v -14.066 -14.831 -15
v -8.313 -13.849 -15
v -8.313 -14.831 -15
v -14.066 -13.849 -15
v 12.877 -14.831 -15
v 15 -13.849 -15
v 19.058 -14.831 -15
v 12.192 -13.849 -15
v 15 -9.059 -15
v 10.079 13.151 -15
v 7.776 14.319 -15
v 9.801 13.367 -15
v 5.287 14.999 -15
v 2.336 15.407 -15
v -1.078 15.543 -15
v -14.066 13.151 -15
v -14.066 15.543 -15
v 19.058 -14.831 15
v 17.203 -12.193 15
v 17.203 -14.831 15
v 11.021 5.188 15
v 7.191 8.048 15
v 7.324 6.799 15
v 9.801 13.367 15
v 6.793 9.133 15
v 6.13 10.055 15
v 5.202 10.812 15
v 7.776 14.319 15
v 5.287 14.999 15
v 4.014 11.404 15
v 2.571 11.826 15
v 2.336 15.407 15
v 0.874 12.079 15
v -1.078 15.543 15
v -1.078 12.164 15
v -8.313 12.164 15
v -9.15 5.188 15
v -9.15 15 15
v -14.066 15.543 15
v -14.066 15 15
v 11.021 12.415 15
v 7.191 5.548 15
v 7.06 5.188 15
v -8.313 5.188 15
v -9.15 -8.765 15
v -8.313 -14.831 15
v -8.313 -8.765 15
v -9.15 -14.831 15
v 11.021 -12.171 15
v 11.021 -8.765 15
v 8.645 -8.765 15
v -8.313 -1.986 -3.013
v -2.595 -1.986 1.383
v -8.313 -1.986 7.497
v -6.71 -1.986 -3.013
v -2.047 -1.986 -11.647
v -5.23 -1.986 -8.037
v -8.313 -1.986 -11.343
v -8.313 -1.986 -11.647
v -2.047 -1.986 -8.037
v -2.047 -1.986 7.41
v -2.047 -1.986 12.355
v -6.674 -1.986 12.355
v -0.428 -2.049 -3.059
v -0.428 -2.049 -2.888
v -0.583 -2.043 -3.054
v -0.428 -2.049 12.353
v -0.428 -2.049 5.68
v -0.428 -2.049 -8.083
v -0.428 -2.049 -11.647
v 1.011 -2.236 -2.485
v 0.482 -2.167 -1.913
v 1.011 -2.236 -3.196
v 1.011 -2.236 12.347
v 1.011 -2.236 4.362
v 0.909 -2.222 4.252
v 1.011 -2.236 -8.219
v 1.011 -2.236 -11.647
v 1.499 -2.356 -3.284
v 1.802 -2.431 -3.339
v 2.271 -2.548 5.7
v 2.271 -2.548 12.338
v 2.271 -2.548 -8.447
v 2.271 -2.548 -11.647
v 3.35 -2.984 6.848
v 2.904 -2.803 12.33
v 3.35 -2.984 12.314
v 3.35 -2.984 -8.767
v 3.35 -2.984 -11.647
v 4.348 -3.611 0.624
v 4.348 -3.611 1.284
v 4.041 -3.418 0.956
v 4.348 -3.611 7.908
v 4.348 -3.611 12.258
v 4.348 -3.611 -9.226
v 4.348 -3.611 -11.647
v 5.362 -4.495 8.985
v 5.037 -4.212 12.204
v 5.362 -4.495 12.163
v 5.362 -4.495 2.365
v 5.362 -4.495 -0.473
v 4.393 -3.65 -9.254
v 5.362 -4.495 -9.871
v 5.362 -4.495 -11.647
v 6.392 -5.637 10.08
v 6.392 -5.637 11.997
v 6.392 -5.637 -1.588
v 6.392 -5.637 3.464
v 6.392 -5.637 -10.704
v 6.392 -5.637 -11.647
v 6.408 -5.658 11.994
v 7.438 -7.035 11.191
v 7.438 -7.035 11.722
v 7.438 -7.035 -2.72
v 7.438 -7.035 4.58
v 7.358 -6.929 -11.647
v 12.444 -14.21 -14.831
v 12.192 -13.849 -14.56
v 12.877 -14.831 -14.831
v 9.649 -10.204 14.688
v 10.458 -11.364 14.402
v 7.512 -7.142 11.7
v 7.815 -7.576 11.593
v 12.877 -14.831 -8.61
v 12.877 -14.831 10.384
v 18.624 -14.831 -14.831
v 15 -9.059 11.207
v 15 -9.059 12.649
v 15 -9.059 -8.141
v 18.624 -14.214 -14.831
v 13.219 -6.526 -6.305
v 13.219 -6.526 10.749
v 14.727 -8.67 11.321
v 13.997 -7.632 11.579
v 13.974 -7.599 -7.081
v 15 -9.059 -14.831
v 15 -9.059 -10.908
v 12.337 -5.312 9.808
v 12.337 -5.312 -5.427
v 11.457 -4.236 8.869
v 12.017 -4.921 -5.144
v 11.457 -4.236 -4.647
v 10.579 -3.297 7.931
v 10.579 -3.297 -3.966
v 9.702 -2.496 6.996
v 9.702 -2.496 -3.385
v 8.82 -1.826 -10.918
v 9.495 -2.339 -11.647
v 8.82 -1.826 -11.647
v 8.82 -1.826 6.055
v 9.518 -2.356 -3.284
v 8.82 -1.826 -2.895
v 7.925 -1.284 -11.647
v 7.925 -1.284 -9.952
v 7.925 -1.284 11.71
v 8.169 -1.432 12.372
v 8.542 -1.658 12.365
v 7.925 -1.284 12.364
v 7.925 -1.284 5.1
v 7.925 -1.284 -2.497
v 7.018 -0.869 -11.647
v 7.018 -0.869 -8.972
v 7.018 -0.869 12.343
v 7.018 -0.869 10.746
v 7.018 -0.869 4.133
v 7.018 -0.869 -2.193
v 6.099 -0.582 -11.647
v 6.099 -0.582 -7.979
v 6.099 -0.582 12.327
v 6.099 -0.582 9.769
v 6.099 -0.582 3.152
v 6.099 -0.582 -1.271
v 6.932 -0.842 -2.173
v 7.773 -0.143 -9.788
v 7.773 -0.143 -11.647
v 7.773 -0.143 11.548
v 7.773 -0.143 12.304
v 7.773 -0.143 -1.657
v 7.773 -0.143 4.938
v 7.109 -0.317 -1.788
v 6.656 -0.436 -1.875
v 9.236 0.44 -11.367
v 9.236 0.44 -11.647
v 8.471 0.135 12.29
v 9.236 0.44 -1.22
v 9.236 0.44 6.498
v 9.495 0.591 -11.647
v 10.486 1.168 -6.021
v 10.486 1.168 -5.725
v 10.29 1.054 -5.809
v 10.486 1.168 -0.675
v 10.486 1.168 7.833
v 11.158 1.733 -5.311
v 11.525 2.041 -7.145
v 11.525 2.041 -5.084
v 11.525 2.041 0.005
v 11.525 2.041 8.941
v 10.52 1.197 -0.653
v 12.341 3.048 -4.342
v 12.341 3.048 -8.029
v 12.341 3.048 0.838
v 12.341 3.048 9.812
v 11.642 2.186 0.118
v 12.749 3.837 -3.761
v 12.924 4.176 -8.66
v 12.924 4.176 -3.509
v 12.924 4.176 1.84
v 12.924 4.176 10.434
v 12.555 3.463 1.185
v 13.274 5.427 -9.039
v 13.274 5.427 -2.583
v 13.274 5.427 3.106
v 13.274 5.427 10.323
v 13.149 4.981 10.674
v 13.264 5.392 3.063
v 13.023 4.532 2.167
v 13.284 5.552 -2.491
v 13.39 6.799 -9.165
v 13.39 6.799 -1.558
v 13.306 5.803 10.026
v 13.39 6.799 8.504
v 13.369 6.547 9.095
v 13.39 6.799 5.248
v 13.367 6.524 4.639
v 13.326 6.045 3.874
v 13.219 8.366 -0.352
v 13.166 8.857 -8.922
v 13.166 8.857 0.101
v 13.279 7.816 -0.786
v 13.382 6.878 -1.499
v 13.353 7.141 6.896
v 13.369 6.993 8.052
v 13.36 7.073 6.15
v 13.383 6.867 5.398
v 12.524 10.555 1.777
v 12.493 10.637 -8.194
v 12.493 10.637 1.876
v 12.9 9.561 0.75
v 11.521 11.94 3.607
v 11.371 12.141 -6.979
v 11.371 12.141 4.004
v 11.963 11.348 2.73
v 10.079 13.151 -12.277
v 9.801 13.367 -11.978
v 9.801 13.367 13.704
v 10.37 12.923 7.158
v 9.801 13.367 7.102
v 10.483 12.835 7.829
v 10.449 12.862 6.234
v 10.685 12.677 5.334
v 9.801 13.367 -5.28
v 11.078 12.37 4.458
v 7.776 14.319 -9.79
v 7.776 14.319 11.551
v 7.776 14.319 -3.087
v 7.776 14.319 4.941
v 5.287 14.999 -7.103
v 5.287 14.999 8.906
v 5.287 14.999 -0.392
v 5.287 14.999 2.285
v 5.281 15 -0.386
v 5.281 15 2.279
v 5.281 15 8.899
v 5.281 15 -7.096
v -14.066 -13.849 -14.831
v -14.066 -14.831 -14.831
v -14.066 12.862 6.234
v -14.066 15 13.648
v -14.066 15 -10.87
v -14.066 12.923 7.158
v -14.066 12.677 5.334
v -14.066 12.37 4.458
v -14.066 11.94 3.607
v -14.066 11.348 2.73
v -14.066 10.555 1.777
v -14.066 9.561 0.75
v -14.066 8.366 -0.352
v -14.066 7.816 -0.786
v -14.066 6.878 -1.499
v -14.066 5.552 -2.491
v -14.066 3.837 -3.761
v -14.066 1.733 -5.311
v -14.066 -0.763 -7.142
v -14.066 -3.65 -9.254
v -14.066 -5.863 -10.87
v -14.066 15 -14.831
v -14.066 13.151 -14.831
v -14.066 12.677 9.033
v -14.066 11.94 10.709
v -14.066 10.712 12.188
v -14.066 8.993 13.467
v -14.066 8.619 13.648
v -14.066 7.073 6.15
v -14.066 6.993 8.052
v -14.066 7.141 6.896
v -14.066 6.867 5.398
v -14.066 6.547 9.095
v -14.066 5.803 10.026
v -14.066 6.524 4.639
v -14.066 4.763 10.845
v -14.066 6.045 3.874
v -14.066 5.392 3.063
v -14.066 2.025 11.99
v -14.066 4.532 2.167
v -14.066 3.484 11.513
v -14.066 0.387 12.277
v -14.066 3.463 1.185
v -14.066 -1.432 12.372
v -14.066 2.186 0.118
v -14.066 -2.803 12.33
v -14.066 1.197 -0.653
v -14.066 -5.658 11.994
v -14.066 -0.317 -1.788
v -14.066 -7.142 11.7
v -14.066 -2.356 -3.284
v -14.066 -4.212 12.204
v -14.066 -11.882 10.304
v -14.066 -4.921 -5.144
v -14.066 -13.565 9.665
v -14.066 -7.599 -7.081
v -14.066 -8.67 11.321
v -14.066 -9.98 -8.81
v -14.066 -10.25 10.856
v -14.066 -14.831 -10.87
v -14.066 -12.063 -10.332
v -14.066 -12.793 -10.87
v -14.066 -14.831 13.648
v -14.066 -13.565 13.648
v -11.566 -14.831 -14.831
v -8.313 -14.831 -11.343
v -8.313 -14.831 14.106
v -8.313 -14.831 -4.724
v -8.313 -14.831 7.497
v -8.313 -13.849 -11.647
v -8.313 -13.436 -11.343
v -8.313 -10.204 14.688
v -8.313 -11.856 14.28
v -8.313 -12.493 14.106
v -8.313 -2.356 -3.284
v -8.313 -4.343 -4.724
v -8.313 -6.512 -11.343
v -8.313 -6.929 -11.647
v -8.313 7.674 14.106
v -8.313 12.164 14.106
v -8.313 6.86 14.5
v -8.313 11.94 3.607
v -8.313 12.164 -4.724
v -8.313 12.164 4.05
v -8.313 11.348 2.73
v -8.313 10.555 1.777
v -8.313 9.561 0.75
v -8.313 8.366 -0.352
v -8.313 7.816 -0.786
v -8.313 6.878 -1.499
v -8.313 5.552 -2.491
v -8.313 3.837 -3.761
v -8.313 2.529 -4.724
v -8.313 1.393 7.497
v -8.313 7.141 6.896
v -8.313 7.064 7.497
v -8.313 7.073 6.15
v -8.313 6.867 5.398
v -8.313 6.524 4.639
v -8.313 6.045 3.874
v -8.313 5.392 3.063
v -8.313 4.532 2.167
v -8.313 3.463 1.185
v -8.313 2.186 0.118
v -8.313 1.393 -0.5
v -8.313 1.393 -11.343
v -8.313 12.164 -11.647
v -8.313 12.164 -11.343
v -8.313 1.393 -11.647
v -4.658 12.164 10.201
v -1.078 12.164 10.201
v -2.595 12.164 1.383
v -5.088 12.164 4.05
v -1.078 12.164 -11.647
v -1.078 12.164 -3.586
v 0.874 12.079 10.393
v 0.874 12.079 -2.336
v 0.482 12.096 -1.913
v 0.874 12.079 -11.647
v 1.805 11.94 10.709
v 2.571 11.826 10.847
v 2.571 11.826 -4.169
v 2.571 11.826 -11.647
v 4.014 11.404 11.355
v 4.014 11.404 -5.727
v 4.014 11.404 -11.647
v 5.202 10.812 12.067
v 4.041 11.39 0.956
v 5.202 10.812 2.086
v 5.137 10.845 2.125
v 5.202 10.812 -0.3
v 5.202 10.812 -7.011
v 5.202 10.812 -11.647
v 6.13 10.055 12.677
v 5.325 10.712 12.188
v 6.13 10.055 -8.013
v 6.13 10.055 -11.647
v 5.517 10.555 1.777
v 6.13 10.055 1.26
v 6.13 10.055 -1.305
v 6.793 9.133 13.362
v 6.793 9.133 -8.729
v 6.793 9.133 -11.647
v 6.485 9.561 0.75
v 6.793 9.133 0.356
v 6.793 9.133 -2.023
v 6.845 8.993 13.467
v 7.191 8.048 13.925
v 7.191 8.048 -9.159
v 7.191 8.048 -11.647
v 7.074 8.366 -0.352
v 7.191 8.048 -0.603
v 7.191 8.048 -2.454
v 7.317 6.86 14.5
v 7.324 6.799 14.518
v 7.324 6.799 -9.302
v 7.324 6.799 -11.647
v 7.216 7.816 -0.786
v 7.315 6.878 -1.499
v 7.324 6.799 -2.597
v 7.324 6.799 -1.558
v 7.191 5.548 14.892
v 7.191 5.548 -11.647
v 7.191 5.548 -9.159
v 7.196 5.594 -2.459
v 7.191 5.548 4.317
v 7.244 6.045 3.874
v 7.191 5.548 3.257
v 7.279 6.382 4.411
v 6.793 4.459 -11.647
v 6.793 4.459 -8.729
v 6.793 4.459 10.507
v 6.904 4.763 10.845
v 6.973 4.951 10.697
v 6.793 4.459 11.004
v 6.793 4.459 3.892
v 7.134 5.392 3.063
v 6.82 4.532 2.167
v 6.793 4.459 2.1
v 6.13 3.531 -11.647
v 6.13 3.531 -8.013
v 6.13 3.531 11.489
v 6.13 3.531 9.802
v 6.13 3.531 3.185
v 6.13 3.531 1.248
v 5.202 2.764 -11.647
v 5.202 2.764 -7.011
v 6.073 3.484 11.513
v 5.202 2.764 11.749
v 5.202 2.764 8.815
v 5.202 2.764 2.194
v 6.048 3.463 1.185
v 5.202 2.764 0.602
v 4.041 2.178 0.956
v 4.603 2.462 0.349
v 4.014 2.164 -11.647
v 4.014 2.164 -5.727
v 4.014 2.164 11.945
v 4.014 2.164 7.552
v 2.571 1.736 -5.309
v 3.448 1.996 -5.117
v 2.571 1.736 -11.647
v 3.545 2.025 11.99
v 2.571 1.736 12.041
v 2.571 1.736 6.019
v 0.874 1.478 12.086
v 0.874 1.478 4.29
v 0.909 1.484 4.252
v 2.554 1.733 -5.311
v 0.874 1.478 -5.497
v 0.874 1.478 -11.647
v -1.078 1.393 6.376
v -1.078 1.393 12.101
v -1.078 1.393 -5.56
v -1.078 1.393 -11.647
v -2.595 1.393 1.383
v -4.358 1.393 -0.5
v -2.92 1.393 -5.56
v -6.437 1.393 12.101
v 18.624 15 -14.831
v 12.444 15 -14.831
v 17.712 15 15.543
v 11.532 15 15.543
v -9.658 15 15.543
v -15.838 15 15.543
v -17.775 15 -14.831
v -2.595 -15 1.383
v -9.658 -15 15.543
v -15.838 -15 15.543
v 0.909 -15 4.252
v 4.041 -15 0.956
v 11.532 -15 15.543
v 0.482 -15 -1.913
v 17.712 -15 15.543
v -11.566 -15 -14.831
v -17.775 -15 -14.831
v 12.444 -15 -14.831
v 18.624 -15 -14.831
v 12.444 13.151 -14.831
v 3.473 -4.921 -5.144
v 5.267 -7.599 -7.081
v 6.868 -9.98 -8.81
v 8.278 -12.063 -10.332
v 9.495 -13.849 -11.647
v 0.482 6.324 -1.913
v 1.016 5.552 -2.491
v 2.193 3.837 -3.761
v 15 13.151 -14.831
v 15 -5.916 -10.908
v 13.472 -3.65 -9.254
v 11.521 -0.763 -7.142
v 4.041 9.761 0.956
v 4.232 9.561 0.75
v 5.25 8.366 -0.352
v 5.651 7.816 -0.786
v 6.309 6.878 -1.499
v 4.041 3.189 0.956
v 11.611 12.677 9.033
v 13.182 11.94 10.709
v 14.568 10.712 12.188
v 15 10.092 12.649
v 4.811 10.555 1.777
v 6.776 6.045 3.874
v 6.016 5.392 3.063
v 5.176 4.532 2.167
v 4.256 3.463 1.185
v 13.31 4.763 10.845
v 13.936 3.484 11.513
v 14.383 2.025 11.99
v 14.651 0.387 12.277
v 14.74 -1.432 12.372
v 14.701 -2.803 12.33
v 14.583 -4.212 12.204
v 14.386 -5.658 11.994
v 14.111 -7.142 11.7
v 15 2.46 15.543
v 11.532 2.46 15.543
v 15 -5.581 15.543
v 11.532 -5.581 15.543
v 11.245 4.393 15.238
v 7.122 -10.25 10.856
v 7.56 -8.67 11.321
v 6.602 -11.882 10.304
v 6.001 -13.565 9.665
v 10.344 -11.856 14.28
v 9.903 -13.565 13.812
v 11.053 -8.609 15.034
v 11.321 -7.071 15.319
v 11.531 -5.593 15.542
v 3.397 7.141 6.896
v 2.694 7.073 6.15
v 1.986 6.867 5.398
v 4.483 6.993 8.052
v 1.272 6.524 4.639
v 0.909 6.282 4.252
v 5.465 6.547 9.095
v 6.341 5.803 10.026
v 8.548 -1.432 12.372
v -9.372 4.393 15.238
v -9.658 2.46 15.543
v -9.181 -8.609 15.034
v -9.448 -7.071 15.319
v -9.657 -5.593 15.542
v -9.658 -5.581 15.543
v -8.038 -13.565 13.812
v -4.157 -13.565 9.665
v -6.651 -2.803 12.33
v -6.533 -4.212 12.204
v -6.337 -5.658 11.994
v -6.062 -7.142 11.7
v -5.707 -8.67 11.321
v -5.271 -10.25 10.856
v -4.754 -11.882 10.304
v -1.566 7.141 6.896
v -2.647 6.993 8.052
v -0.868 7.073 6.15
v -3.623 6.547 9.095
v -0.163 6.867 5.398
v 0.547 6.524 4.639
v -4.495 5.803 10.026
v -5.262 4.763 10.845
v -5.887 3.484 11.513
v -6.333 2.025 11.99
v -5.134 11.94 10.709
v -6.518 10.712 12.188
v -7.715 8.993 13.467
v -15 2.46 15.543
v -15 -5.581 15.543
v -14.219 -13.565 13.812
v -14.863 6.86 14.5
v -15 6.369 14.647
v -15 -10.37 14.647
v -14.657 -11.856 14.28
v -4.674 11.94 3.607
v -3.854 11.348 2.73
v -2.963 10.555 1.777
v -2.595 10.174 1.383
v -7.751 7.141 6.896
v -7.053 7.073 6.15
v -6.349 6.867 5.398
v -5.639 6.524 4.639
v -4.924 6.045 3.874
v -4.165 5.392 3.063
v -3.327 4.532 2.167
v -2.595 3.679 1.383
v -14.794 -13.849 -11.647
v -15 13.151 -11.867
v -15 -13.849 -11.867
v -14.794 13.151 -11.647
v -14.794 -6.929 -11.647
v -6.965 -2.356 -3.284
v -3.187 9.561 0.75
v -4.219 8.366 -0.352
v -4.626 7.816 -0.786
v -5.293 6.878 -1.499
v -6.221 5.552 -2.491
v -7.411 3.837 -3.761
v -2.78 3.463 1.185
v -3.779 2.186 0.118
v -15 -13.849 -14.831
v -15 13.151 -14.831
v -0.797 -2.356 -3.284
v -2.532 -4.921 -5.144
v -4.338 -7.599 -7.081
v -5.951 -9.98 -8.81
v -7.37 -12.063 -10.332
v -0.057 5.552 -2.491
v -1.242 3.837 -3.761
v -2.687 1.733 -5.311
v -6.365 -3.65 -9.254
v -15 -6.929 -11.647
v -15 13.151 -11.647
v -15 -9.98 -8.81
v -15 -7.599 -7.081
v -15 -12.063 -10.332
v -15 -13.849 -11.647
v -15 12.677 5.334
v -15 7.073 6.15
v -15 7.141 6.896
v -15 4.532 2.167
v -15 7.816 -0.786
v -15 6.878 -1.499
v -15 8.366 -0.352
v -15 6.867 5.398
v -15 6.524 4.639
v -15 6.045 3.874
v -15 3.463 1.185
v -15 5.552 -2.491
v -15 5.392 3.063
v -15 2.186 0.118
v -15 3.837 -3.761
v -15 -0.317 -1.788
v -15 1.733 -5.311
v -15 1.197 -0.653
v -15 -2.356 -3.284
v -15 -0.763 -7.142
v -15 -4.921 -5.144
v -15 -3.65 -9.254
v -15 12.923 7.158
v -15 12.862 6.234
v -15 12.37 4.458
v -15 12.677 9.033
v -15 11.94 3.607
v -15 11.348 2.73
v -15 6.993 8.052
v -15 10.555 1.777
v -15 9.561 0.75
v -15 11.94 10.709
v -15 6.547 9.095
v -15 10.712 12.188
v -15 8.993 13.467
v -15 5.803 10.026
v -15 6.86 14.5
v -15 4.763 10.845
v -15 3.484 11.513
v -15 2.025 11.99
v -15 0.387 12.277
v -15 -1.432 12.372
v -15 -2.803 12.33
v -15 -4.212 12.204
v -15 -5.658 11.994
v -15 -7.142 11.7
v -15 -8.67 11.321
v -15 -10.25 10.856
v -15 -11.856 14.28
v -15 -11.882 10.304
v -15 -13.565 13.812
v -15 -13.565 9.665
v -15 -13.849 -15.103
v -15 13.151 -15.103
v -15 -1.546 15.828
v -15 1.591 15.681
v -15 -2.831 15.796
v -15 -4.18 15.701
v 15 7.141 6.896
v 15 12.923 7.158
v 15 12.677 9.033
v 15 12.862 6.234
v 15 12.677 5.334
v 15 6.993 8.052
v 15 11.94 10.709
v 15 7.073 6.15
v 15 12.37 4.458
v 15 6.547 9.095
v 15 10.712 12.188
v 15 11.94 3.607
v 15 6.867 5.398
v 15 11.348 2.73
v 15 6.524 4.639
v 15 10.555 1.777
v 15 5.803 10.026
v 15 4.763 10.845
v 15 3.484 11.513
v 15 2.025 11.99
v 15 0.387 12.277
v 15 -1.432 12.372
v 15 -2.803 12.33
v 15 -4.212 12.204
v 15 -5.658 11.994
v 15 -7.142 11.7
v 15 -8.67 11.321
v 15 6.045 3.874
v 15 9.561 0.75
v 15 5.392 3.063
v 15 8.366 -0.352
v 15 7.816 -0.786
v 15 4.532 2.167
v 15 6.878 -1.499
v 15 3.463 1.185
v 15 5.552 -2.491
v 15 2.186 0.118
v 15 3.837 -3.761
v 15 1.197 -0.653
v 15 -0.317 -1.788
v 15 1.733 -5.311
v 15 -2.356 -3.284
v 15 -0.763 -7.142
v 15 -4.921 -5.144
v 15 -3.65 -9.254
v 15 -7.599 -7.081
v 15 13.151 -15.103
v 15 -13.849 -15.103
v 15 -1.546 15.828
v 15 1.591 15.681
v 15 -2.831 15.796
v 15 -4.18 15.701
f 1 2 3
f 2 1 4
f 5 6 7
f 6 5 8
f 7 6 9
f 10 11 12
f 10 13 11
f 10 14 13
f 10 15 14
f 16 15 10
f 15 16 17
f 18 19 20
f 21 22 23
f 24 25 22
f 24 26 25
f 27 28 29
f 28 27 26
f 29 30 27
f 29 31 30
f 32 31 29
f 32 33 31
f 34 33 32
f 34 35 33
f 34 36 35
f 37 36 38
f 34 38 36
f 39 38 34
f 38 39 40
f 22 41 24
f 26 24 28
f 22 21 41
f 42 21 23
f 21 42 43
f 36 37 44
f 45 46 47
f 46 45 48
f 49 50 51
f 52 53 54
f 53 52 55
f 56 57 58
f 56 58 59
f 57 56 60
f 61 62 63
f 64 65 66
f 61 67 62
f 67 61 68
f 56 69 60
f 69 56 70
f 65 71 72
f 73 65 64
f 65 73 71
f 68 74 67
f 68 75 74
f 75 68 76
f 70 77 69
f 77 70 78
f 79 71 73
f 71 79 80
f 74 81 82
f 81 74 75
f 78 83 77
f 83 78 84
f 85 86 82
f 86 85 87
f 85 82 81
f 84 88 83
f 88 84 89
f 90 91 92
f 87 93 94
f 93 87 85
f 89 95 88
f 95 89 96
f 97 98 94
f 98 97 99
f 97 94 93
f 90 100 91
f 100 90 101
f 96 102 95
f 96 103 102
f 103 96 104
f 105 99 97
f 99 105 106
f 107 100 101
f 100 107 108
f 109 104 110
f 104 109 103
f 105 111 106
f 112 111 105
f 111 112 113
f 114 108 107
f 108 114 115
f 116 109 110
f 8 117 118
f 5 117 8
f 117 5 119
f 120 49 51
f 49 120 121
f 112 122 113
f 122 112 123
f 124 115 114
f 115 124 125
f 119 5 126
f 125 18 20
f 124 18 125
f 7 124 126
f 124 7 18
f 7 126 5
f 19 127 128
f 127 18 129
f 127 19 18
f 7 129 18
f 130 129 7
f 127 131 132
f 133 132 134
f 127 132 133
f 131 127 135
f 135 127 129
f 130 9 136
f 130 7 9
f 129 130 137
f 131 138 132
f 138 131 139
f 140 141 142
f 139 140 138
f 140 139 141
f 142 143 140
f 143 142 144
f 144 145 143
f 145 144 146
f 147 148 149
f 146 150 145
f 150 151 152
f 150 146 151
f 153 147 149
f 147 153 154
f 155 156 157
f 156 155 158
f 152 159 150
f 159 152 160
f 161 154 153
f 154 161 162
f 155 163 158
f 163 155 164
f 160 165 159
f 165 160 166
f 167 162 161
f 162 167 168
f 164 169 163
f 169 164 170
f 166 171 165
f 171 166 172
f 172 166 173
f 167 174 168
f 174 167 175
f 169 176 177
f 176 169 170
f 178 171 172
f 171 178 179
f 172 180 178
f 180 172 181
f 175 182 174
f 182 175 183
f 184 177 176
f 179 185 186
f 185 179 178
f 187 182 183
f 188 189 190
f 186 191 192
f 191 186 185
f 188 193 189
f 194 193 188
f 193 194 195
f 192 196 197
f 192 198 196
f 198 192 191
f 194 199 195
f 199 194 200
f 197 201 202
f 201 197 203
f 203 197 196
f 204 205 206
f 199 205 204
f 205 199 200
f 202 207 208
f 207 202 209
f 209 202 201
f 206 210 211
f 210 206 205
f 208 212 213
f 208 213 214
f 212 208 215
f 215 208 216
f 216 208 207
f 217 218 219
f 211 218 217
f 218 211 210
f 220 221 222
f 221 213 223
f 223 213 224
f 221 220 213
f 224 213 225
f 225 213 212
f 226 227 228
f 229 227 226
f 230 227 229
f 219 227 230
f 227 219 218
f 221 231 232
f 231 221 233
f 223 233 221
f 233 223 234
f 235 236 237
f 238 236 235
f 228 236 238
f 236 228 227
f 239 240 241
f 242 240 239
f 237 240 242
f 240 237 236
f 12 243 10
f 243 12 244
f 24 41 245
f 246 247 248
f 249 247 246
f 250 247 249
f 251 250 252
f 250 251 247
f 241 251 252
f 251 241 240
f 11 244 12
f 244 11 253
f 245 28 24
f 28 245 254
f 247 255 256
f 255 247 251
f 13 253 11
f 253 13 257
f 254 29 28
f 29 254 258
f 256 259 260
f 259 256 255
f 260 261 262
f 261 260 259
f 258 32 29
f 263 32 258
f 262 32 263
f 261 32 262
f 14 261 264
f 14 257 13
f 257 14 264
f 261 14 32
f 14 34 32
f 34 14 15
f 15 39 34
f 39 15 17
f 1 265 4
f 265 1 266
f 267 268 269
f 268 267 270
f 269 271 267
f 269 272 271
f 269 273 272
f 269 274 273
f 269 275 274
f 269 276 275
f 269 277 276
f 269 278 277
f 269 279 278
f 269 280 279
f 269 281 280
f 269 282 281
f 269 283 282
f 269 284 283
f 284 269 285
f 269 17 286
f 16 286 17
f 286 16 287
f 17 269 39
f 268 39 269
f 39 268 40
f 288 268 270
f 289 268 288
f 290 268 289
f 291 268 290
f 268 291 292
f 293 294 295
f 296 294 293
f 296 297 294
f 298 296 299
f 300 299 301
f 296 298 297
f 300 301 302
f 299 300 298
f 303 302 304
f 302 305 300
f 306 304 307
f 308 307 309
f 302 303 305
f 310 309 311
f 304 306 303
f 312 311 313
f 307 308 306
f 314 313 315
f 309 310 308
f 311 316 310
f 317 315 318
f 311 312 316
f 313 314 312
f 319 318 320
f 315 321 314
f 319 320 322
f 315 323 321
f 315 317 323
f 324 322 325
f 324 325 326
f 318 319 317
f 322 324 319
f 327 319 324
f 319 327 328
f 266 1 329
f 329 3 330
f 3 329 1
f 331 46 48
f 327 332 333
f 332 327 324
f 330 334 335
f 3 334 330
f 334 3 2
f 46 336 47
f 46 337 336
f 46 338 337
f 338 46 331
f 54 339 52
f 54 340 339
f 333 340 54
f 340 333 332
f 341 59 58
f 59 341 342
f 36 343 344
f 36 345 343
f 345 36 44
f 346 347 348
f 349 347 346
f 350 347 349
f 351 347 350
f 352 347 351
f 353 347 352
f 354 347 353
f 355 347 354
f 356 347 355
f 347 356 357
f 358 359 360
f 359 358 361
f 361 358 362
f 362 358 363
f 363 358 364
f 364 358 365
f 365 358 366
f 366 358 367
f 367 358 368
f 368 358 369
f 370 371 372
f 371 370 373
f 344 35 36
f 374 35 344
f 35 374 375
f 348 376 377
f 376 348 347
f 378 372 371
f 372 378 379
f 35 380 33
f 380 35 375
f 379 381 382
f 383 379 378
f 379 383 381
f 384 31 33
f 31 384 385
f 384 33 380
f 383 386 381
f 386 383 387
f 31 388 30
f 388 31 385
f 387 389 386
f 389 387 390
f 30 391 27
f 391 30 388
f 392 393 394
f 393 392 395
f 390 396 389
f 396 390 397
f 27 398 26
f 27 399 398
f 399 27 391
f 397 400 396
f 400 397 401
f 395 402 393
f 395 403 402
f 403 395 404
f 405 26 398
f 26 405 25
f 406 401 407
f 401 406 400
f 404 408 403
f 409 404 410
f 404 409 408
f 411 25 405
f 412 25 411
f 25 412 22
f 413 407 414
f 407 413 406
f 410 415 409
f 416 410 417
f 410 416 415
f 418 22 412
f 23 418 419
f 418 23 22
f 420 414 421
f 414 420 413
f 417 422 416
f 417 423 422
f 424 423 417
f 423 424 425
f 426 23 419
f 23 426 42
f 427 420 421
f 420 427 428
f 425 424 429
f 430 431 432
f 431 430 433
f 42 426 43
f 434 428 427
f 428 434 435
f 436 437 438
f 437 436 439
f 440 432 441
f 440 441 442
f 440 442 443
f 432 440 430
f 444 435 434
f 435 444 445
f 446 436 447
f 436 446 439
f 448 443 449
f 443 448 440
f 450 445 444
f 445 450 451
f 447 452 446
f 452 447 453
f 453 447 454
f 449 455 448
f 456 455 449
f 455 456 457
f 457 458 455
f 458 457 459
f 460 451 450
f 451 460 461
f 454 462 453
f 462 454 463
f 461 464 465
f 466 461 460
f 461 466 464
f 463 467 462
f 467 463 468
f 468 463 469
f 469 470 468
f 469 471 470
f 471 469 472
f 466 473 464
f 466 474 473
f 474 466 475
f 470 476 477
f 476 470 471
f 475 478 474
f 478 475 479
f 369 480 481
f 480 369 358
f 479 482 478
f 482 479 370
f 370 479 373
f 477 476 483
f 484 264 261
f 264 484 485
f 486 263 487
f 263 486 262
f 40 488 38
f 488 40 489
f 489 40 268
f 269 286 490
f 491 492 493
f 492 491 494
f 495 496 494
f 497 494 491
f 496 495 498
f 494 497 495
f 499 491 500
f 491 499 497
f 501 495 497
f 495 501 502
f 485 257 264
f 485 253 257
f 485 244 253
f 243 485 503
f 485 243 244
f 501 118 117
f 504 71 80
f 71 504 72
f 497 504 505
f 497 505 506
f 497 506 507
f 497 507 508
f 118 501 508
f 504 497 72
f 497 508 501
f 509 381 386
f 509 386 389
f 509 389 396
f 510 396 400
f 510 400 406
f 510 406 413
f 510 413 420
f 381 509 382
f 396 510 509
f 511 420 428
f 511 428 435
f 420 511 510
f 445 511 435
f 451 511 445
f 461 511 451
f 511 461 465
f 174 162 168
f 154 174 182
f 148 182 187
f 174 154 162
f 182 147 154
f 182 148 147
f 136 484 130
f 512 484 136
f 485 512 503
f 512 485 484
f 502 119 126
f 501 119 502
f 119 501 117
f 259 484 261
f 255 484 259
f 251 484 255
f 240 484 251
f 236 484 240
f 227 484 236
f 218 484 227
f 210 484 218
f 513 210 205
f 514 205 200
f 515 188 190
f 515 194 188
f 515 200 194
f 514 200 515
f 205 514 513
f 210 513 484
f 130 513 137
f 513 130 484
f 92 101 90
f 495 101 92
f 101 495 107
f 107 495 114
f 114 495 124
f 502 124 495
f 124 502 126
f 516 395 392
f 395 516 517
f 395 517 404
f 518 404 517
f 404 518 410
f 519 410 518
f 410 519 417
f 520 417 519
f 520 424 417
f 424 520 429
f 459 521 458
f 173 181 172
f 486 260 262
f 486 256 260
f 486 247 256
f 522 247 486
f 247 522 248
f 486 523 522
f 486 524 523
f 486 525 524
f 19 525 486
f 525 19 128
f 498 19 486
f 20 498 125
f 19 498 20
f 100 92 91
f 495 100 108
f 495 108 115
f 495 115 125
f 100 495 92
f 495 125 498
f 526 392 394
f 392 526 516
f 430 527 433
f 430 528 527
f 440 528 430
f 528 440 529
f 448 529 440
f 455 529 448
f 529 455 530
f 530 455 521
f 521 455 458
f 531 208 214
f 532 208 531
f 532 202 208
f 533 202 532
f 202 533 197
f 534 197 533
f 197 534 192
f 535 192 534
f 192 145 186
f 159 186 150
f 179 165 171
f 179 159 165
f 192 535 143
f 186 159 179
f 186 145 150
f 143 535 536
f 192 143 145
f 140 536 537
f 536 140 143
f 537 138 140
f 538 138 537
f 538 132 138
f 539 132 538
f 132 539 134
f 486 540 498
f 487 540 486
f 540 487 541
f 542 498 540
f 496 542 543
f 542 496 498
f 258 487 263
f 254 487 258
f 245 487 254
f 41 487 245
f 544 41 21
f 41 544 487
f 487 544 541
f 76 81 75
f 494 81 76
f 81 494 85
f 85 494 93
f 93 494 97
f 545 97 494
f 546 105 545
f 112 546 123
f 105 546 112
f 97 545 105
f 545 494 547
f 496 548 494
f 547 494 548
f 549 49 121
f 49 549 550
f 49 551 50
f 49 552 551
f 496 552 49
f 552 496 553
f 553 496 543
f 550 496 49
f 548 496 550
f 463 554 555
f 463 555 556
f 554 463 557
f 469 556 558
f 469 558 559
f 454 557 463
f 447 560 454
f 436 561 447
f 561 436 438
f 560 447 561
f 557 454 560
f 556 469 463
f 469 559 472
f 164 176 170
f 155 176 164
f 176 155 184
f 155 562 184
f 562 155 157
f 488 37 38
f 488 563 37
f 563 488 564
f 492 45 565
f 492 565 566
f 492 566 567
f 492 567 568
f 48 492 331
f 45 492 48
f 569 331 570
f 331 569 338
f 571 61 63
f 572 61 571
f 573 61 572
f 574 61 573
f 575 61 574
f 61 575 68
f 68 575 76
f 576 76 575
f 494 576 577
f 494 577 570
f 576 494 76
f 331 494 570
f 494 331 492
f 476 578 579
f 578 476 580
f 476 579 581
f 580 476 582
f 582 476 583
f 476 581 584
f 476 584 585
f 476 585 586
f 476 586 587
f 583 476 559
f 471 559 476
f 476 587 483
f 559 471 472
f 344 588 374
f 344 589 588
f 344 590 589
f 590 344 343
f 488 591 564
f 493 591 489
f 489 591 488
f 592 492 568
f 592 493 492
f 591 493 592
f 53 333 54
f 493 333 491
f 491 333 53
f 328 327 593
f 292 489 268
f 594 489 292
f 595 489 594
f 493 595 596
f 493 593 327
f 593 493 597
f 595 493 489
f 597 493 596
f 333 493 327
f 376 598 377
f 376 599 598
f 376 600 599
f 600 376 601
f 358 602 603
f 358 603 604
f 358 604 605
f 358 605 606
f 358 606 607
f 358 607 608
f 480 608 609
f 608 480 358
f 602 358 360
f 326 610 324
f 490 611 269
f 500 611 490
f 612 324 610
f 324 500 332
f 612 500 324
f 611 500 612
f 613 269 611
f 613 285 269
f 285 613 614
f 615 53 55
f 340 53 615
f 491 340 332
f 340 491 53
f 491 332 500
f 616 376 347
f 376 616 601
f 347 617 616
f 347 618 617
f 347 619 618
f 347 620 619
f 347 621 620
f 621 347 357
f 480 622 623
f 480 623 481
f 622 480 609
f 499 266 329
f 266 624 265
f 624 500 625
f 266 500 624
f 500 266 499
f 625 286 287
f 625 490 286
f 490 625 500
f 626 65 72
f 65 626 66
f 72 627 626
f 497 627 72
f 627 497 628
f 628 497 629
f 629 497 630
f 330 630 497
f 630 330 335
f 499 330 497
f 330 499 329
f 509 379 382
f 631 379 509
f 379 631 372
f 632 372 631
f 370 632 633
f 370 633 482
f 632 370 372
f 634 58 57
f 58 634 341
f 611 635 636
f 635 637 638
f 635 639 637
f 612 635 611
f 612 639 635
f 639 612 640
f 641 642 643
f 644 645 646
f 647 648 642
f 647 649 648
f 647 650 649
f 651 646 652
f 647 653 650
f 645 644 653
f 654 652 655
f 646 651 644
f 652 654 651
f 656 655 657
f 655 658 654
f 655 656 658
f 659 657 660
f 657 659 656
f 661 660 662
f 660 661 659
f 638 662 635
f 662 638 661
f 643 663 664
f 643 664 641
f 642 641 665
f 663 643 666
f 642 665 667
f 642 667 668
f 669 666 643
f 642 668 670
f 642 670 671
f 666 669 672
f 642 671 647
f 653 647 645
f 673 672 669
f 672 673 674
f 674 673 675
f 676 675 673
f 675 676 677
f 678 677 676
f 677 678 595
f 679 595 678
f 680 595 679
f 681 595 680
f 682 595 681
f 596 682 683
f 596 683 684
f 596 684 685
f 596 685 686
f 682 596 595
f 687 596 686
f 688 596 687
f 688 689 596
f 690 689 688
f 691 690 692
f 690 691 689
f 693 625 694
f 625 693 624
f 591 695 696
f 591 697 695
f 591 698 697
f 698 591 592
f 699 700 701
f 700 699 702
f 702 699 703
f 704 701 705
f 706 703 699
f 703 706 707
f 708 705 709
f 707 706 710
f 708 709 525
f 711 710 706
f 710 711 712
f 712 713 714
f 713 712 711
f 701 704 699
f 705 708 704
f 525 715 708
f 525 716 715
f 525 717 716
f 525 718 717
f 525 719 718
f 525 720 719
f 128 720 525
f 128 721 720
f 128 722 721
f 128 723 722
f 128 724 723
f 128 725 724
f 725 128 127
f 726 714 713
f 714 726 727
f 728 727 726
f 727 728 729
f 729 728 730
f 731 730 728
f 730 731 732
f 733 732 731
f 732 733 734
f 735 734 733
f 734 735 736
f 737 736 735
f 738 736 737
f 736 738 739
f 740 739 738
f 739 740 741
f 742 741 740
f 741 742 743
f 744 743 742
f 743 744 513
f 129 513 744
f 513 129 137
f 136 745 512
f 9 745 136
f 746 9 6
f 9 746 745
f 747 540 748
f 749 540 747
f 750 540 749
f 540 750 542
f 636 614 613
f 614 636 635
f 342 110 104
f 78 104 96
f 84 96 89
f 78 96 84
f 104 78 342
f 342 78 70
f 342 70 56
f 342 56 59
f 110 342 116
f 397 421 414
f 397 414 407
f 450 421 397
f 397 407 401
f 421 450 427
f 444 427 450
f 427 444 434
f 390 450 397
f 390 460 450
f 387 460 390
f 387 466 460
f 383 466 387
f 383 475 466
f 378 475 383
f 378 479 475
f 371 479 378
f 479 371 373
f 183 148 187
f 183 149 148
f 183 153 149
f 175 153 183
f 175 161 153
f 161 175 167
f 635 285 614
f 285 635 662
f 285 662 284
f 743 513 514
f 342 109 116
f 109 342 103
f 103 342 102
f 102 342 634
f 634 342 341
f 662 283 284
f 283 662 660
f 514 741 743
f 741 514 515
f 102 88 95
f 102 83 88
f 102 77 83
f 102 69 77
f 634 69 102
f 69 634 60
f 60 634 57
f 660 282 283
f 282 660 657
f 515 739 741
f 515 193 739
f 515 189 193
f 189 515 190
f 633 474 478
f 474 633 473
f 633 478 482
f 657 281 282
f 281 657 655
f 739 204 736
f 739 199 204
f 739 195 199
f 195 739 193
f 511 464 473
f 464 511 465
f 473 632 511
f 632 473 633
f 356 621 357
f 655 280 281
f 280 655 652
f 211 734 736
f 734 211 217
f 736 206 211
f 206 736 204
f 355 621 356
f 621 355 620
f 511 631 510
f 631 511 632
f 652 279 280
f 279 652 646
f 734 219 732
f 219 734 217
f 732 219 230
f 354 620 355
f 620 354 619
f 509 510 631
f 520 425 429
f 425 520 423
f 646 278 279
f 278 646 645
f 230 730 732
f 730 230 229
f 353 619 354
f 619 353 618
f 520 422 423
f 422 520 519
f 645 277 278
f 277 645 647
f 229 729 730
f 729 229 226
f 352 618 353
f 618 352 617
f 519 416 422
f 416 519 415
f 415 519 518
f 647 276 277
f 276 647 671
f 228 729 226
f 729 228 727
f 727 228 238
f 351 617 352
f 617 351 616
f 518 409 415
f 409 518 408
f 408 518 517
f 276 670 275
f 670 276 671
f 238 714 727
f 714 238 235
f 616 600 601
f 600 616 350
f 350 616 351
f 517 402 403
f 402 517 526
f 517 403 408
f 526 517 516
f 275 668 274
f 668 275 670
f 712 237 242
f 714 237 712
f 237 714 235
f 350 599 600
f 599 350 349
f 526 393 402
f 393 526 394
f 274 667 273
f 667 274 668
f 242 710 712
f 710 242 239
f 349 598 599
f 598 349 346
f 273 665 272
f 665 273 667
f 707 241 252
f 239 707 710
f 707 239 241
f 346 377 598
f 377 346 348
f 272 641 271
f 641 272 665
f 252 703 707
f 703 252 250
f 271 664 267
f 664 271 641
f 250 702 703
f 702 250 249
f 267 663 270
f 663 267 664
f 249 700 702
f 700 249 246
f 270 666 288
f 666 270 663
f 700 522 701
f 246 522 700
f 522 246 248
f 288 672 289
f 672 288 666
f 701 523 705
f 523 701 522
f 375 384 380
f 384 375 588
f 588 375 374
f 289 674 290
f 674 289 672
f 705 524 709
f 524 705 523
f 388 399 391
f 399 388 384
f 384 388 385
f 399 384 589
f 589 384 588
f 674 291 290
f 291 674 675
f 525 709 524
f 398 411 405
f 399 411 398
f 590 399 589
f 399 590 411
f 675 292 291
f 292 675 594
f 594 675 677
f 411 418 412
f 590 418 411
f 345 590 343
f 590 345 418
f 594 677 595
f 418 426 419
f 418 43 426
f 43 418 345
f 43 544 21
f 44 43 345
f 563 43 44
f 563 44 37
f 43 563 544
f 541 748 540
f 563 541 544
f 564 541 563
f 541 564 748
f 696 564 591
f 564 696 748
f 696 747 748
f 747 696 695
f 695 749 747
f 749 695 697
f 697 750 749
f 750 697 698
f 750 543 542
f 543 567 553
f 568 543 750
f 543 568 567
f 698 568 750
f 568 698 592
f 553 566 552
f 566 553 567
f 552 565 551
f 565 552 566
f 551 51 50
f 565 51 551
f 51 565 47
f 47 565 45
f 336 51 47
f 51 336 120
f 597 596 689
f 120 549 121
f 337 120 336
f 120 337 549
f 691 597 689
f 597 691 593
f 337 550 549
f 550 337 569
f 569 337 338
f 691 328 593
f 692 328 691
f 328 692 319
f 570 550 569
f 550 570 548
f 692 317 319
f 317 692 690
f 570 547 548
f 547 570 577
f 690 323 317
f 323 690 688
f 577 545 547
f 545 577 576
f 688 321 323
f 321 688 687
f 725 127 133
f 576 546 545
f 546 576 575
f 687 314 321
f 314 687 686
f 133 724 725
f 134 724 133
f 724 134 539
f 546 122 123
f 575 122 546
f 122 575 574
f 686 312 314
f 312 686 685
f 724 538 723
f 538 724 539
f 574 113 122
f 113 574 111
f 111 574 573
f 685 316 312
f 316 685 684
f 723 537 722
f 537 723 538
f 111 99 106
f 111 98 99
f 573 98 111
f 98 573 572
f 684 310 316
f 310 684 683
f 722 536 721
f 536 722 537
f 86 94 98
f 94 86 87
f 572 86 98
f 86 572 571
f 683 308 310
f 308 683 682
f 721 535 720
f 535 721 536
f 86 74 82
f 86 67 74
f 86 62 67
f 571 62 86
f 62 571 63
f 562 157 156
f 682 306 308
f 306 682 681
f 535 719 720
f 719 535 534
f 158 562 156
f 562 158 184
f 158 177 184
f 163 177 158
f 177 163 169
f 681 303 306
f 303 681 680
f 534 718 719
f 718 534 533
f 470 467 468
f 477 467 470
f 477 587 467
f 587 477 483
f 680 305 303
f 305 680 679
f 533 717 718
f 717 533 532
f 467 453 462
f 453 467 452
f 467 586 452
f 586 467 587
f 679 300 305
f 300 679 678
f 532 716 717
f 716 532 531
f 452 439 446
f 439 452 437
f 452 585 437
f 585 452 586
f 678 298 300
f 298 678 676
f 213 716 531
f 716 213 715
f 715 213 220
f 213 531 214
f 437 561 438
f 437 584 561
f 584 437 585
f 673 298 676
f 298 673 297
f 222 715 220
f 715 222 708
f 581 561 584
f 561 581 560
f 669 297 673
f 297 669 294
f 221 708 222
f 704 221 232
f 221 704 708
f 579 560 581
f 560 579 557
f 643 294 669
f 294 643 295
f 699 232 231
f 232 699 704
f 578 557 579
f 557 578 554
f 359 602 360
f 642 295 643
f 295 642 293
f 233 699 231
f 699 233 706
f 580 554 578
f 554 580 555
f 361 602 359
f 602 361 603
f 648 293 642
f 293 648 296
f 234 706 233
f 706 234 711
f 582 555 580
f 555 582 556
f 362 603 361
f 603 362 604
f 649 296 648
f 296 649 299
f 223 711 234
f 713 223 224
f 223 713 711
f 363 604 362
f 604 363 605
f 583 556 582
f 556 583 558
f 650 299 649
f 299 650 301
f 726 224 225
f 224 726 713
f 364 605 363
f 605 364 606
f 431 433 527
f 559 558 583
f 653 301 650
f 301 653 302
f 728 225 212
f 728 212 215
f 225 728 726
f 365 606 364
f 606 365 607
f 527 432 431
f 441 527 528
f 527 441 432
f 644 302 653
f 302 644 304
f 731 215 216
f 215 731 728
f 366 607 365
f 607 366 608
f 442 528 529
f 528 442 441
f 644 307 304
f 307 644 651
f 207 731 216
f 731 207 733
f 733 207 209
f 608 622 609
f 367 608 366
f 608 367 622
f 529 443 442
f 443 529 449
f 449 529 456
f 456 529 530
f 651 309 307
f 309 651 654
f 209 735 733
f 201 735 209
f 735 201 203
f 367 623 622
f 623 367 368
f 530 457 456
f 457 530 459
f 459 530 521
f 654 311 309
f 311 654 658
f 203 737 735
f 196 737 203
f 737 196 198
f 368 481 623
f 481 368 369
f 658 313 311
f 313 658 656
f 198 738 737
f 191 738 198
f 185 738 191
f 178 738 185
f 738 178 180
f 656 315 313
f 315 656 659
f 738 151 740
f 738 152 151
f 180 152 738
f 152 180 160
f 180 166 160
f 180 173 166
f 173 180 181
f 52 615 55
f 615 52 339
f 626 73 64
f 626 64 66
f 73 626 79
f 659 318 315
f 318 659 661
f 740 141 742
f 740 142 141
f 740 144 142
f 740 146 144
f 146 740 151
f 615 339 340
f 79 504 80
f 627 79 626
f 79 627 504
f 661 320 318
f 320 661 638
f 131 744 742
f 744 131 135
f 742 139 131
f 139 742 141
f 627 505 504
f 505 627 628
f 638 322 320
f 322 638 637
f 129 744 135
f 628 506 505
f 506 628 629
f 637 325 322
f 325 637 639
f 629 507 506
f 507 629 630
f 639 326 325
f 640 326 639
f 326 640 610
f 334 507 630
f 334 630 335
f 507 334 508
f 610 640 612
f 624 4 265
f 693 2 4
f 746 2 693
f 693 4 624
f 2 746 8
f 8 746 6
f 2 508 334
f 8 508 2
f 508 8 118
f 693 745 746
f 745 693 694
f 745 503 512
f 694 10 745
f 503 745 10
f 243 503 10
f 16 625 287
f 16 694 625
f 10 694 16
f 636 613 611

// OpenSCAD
monogram = "RX2";
size = 30;

//Word("Calibri");
Union("Calibri");
//Difference("Calibri");
//Intersection("Impact");

module Word(font) {
  LetterBlock(monogram[0], font);
  translate([size,0,0]) LetterBlock(monogram[1], font);
  translate([size*2,0,0]) LetterBlock(monogram[2], font);
}

module Union(font) {
  union() {
    LetterBlock(monogram[0], font);
    rotate([90,0,0]) LetterBlock(monogram[1], font);
    rotate([90, 0, 90]) LetterBlock(monogram[2], font);
  }
}

module Intersection(font) {
  intersection() {
    LetterBlock(monogram[0], font);
    rotate([90,0,0]) LetterBlock(monogram[1], font);
    rotate([90, 0, 90]) LetterBlock(monogram[2], font);
  }
}

module Difference(font) {
  difference() {
    cube([size*.99,size*.99,size*.99], true);
    cube([size*.75,size*.75,size*.75], true);
    LetterBlock(monogram[0], font);
    rotate([90,0,0]) LetterBlock(monogram[1], font);
    rotate([90, 0, 90]) LetterBlock(monogram[2], font);
  }
}

module LetterBlock(letter, font) {
  scale([1.4,1,1]) {
    translate([0,0,-size/2]) {
      linear_extrude(height=size, convexity=4) {
        text(letter, size=size, font=font, halign="center", valign="center");
      }
    }
  }
}
